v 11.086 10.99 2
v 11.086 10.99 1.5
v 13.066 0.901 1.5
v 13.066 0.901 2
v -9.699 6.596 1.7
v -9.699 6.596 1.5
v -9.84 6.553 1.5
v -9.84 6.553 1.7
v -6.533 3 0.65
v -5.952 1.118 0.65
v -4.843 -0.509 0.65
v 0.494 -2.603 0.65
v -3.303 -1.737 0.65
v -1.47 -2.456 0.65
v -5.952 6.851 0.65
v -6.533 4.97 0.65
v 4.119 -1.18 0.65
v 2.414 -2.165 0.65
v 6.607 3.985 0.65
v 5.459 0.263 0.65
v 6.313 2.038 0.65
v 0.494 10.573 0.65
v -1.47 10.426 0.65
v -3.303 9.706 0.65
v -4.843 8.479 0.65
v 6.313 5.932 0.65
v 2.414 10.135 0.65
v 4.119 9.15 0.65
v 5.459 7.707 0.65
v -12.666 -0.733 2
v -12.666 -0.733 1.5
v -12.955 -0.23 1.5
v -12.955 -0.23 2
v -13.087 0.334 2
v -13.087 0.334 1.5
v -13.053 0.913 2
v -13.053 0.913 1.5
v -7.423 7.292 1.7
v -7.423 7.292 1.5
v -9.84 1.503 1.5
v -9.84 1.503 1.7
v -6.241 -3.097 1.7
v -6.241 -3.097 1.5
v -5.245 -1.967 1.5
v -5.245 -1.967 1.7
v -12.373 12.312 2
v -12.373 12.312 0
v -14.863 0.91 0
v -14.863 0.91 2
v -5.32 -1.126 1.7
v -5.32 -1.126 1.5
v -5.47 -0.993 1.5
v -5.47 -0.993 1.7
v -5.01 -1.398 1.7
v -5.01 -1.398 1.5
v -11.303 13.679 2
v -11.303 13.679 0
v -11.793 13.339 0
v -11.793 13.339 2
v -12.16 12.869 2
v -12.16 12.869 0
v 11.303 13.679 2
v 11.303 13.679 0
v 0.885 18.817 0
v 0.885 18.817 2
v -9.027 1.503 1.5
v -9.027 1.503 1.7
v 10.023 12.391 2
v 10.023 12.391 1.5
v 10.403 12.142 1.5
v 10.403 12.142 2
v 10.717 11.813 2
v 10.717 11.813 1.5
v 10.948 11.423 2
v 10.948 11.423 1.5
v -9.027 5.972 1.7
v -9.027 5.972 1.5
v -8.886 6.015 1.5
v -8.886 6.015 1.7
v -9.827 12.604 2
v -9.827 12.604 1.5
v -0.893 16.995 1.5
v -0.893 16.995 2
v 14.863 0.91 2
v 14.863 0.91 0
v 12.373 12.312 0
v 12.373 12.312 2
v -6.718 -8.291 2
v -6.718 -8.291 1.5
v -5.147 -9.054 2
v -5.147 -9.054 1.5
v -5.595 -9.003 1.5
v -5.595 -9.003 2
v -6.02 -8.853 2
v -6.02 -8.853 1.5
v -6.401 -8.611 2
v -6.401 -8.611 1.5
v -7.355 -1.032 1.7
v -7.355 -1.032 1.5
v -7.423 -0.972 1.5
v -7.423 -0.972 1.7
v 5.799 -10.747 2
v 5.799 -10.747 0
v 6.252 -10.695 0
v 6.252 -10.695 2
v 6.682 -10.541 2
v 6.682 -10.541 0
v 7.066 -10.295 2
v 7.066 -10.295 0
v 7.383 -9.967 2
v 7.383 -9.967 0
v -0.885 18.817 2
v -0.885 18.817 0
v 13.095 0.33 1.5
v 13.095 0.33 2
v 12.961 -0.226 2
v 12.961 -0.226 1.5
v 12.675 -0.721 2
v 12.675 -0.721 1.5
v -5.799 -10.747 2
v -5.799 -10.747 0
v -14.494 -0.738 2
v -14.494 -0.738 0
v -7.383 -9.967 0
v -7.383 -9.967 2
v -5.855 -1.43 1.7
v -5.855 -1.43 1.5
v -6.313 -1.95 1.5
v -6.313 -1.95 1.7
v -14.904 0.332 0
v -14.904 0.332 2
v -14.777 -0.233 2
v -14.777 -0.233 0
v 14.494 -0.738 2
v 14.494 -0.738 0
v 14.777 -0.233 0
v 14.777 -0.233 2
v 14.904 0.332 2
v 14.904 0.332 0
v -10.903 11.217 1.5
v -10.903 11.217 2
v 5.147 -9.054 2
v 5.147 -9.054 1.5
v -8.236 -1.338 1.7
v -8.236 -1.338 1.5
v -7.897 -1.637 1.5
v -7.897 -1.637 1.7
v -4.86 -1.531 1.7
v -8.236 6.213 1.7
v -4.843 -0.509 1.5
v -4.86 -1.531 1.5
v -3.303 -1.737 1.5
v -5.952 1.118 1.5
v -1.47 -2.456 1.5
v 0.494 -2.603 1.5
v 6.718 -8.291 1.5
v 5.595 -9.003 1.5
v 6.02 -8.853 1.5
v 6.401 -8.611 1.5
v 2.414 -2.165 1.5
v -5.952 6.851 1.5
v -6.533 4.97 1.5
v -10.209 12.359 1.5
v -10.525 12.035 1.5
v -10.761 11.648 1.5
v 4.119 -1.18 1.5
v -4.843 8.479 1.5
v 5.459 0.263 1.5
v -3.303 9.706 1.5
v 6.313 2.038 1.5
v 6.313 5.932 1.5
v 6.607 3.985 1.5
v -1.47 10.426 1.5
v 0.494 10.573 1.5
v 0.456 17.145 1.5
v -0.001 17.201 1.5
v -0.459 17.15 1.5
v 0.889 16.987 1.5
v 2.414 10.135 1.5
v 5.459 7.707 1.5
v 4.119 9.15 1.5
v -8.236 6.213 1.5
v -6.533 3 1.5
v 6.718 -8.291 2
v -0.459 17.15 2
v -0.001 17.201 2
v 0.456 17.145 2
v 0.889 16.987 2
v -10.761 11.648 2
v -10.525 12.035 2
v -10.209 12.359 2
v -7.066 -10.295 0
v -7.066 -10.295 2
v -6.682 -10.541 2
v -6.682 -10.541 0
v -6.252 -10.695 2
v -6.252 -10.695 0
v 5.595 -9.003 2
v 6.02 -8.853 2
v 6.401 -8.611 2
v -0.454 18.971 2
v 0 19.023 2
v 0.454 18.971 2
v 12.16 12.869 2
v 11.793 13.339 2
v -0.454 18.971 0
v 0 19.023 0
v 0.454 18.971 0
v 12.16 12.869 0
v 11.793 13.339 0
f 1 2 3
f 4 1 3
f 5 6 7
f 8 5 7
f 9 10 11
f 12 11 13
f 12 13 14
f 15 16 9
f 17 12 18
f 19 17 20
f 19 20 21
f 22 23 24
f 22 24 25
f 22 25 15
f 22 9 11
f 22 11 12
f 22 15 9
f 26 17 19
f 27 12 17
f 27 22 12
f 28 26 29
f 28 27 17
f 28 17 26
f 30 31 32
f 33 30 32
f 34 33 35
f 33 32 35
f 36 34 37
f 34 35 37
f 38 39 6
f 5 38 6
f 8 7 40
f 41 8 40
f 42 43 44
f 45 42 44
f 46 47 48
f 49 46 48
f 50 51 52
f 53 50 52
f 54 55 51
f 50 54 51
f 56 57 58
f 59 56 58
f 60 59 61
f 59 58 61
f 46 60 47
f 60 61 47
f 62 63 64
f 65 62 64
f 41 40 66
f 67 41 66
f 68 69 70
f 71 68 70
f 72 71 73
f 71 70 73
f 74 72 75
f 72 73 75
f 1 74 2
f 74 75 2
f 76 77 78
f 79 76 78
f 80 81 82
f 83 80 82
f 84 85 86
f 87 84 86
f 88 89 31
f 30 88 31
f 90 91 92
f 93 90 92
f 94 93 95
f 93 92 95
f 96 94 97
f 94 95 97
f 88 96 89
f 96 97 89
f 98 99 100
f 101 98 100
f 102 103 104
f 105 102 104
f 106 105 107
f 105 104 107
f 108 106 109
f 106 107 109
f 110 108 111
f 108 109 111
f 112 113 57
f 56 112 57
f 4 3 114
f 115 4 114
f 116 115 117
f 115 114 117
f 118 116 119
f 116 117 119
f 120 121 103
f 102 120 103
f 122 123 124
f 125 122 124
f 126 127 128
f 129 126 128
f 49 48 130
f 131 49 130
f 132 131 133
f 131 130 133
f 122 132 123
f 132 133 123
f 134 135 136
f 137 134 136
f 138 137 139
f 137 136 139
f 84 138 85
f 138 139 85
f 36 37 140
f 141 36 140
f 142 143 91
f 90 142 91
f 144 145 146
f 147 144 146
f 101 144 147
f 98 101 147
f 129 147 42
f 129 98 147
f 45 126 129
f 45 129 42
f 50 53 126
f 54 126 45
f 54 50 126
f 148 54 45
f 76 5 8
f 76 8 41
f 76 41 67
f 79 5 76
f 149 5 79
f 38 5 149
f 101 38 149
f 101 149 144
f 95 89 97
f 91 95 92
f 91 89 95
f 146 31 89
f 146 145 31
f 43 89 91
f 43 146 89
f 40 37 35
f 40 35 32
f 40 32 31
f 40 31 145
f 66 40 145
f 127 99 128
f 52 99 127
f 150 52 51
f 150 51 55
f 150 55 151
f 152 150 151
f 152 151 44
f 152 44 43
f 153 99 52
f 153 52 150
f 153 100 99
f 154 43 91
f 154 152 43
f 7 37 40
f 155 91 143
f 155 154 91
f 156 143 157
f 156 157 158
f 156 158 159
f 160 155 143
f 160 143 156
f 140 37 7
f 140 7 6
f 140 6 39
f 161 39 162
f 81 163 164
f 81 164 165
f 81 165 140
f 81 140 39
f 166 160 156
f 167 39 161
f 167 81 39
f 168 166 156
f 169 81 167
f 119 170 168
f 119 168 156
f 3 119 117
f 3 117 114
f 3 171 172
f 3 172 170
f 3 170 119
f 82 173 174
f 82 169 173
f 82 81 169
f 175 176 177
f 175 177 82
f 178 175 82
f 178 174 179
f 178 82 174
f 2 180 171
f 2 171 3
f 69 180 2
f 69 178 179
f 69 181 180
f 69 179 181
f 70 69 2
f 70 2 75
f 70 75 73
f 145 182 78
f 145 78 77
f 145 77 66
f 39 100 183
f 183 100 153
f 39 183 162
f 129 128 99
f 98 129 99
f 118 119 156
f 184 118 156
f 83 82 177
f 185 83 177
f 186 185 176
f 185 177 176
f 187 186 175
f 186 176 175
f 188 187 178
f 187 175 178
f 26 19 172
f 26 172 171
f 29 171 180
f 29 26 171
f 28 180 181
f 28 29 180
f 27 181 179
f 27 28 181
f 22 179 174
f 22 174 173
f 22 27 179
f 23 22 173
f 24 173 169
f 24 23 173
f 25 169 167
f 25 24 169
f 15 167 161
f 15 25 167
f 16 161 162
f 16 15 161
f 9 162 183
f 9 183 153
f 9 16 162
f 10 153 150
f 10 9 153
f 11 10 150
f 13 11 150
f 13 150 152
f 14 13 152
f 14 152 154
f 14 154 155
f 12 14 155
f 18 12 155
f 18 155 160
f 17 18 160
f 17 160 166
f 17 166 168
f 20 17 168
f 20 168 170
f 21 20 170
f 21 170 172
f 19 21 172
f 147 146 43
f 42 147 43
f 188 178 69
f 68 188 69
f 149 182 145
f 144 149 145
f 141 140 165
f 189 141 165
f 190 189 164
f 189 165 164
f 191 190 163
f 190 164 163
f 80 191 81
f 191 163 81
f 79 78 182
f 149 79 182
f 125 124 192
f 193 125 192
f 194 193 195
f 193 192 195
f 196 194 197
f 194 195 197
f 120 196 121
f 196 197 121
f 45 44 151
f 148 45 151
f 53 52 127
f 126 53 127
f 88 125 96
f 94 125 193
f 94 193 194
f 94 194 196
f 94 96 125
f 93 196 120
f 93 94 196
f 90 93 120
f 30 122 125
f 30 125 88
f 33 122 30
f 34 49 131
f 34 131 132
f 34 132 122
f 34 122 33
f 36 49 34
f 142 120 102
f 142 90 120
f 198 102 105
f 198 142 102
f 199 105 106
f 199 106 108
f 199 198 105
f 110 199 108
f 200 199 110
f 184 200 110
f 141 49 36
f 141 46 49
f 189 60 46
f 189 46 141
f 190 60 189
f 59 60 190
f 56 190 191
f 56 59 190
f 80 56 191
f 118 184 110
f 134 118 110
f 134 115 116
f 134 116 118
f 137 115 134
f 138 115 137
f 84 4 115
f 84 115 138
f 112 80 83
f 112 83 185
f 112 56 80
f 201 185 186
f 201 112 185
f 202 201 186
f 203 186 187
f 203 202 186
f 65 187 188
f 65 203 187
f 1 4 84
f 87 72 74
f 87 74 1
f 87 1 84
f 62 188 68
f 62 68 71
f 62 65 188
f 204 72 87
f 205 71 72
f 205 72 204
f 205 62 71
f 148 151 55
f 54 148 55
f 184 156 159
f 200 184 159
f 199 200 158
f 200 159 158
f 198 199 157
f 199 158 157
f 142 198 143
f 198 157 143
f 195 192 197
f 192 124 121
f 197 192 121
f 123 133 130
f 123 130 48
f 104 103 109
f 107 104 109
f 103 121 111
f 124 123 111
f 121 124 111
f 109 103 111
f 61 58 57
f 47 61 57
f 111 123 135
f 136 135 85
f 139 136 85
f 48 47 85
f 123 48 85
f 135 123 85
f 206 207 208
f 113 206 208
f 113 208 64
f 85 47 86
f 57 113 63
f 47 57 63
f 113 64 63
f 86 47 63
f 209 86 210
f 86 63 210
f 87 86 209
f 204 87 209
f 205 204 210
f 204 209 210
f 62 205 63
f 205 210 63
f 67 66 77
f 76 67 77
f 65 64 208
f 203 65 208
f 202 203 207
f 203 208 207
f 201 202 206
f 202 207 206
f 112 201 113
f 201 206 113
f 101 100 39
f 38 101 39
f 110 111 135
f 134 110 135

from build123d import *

# Parameters (mm, degrees)
F0_R     = 6.6066656701
F1_DEPTH = 1.5
F2_DEPTH = 2
F3_DEPTH = 0.65
F5_DEPTH = 1.7


# Not quite as in the source:
# - a feature names something its author has since deleted; it is built from what else it names


with BuildPart() as f1:
    # F0 (on Top) → F1 (new body)
    with BuildSketch(Plane.XY):
        with BuildLine():
            ThreePointArc((0.8885468305, 16.9870886264), (-0.0010928636, 17.2005022258), (-0.8926896019, 16.9954183263))
            Line((-0.8926896019, 16.9954183263), (-9.8272421593, 12.6038188933))
            ThreePointArc((-9.8272421593, 12.6038188933), (-10.5252186518, 12.034854024), (-10.9028479986, 11.2173650131))
            Line((-10.9028479986, 11.2173650131), (-13.052575898, 0.9126909889))
            ThreePointArc((-13.052575898, 0.9126909889), (-13.0418066326, 0.0472202699), (-12.6663707931, -0.732653741))
            Line((-12.6663707931, -0.732653741), (-6.7182242373, -8.2905330076))
            ThreePointArc((-6.7182242373, -8.2905330076), (-6.0201328246, -8.8527685293), (-5.146579379, -9.0536286299))
            Line((-5.146579379, -9.0536286299), (5.146579379, -9.0536286299))
            ThreePointArc((5.146579379, -9.0536286299), (6.0201328246, -8.8527685293), (6.7182242373, -8.2905330076))
            Line((6.7182242373, -8.2905330076), (12.6752768476, -0.7213374622))
            ThreePointArc((12.6752768476, -0.7213374622), (13.0479677297, 0.0469961856), (13.0661891506, 0.9007543878))
            Line((13.0661891506, 0.9007543878), (11.0860832533, 10.9895326776))
            ThreePointArc((11.0860832533, 10.9895326776), (10.7166616036, 11.8134437296), (10.0225184006, 12.3909097378))
            Line((10.0225184006, 12.3909097378), (0.8885468305, 16.9870886264))
        make_face()
        with Locations((0, 3.9848611549)):
            Circle(F0_R, mode=Mode.SUBTRACT)
    extrude(amount=F1_DEPTH)

    # F0 (on Top) → F2 (join)
    with BuildSketch(Plane.XY):
        with BuildLine():
            Line((-5.7990739843, -10.7466970864), (5.7990739843, -10.7466970864))
            ThreePointArc((5.7990739843, -10.7466970864), (6.6819267685, -10.541292016), (7.3834371144, -9.9672680479))
            Line((7.3834371144, -9.9672680479), (14.4937978518, -0.737658505))
            ThreePointArc((14.4937978518, -0.737658505), (14.8609319824, 0.0451243323), (14.8633622841, 0.9097228137))
            Line((14.8633622841, 0.9097228137), (12.3725781296, 12.3124728375))
            ThreePointArc((12.3725781296, 12.3124728375), (11.9938877885, 13.1179886127), (11.3031972843, 13.6794230844))
            Line((11.3031972843, 13.6794230844), (0.8845467171, 18.817111544))
            ThreePointArc((0.8845467171, 18.817111544), (0, 19.0233509398), (-0.8845467171, 18.817111544))
            Line((-0.8845467171, 18.817111544), (-11.3031972843, 13.6794230844))
            ThreePointArc((-11.3031972843, 13.6794230844), (-11.9938877885, 13.1179886127), (-12.3725781296, 12.3124728375))
            Line((-12.3725781296, 12.3124728375), (-14.8633622841, 0.9097228137))
            ThreePointArc((-14.8633622841, 0.9097228137), (-14.8609319824, 0.0451243323), (-14.4937978518, -0.737658505))
            Line((-14.4937978518, -0.737658505), (-7.3834371144, -9.9672680479))
            ThreePointArc((-7.3834371144, -9.9672680479), (-6.6819267685, -10.541292016), (-5.7990739843, -10.7466970864))
        make_face()
        with BuildLine():
            Line((-9.8272421593, 12.6038188933), (-0.8926896019, 16.9954183263))
            ThreePointArc((-0.8926896019, 16.9954183263), (-0.0010928636, 17.2005022258), (0.8885468305, 16.9870886264))
            Line((0.8885468305, 16.9870886264), (10.0225184006, 12.3909097378))
            ThreePointArc((10.0225184006, 12.3909097378), (10.7166616036, 11.8134437296), (11.0860832533, 10.9895326776))
            Line((11.0860832533, 10.9895326776), (13.0661891506, 0.9007543878))
            ThreePointArc((13.0661891506, 0.9007543878), (13.0479677297, 0.0469961856), (12.6752768476, -0.7213374622))
            Line((12.6752768476, -0.7213374622), (6.7182242373, -8.2905330076))
            ThreePointArc((6.7182242373, -8.2905330076), (6.0201328246, -8.8527685293), (5.146579379, -9.0536286299))
            Line((5.146579379, -9.0536286299), (-5.146579379, -9.0536286299))
            ThreePointArc((-5.146579379, -9.0536286299), (-6.0201328246, -8.8527685293), (-6.7182242373, -8.2905330076))
            Line((-6.7182242373, -8.2905330076), (-12.6663707931, -0.732653741))
            ThreePointArc((-12.6663707931, -0.732653741), (-13.0418066326, 0.0472202699), (-13.052575898, 0.9126909889))
            Line((-13.052575898, 0.9126909889), (-10.9028479986, 11.2173650131))
            ThreePointArc((-10.9028479986, 11.2173650131), (-10.5252186518, 12.034854024), (-9.8272421593, 12.6038188933))
        make_face(mode=Mode.SUBTRACT)
    extrude(amount=F2_DEPTH)

    # F0 (on Top) → F3 (join)
    with BuildSketch(Plane.XY):
        with Locations((0, 3.9848611549)):
            Circle(F0_R)
    extrude(amount=F3_DEPTH)

    # F4 (on Top) → F5 (join)
    with BuildSketch(Plane.XY):
        Polygon((-6.2406868358, -3.0968557074), (-5.2452536218, -1.9672723198), (-4.8604047071, -1.5305590028), (-5.0104551537, -1.3983286602), (-5.3199341997, -1.1256035787), (-5.4699846462, -0.9933732362), (-5.8548335609, -1.4300865532), (-6.3130810083, -1.9500900017), (-7.3554360868, -1.0315257971), (-7.4232057442, -0.9718045152), (-7.4232057442, -0.8814753506), (-7.4232057442, 7.291526825), (-9.6988570439, 6.5962814227), (-9.8404204473, 6.5530316922), (-9.8404204473, 6.405008936), (-9.8404204473, 1.7031954848), (-9.8404204473, 1.5031954848), (-9.6404204473, 1.5031954848), (-9.2274204473, 1.5031954848), (-9.0274204473, 1.5031954848), (-9.0274204473, 1.7031954848), (-9.0274204473, 5.8236241114), (-9.0274204473, 5.9716468677), (-8.8858570439, 6.0148965982), (-8.2362057442, 6.2133747566), (-8.2362057442, -0.8866803037), (-8.2362057442, -1.3383261269), (-7.897357457, -1.6369325365), align=None)
    extrude(amount=F5_DEPTH)


solid = f1.part
